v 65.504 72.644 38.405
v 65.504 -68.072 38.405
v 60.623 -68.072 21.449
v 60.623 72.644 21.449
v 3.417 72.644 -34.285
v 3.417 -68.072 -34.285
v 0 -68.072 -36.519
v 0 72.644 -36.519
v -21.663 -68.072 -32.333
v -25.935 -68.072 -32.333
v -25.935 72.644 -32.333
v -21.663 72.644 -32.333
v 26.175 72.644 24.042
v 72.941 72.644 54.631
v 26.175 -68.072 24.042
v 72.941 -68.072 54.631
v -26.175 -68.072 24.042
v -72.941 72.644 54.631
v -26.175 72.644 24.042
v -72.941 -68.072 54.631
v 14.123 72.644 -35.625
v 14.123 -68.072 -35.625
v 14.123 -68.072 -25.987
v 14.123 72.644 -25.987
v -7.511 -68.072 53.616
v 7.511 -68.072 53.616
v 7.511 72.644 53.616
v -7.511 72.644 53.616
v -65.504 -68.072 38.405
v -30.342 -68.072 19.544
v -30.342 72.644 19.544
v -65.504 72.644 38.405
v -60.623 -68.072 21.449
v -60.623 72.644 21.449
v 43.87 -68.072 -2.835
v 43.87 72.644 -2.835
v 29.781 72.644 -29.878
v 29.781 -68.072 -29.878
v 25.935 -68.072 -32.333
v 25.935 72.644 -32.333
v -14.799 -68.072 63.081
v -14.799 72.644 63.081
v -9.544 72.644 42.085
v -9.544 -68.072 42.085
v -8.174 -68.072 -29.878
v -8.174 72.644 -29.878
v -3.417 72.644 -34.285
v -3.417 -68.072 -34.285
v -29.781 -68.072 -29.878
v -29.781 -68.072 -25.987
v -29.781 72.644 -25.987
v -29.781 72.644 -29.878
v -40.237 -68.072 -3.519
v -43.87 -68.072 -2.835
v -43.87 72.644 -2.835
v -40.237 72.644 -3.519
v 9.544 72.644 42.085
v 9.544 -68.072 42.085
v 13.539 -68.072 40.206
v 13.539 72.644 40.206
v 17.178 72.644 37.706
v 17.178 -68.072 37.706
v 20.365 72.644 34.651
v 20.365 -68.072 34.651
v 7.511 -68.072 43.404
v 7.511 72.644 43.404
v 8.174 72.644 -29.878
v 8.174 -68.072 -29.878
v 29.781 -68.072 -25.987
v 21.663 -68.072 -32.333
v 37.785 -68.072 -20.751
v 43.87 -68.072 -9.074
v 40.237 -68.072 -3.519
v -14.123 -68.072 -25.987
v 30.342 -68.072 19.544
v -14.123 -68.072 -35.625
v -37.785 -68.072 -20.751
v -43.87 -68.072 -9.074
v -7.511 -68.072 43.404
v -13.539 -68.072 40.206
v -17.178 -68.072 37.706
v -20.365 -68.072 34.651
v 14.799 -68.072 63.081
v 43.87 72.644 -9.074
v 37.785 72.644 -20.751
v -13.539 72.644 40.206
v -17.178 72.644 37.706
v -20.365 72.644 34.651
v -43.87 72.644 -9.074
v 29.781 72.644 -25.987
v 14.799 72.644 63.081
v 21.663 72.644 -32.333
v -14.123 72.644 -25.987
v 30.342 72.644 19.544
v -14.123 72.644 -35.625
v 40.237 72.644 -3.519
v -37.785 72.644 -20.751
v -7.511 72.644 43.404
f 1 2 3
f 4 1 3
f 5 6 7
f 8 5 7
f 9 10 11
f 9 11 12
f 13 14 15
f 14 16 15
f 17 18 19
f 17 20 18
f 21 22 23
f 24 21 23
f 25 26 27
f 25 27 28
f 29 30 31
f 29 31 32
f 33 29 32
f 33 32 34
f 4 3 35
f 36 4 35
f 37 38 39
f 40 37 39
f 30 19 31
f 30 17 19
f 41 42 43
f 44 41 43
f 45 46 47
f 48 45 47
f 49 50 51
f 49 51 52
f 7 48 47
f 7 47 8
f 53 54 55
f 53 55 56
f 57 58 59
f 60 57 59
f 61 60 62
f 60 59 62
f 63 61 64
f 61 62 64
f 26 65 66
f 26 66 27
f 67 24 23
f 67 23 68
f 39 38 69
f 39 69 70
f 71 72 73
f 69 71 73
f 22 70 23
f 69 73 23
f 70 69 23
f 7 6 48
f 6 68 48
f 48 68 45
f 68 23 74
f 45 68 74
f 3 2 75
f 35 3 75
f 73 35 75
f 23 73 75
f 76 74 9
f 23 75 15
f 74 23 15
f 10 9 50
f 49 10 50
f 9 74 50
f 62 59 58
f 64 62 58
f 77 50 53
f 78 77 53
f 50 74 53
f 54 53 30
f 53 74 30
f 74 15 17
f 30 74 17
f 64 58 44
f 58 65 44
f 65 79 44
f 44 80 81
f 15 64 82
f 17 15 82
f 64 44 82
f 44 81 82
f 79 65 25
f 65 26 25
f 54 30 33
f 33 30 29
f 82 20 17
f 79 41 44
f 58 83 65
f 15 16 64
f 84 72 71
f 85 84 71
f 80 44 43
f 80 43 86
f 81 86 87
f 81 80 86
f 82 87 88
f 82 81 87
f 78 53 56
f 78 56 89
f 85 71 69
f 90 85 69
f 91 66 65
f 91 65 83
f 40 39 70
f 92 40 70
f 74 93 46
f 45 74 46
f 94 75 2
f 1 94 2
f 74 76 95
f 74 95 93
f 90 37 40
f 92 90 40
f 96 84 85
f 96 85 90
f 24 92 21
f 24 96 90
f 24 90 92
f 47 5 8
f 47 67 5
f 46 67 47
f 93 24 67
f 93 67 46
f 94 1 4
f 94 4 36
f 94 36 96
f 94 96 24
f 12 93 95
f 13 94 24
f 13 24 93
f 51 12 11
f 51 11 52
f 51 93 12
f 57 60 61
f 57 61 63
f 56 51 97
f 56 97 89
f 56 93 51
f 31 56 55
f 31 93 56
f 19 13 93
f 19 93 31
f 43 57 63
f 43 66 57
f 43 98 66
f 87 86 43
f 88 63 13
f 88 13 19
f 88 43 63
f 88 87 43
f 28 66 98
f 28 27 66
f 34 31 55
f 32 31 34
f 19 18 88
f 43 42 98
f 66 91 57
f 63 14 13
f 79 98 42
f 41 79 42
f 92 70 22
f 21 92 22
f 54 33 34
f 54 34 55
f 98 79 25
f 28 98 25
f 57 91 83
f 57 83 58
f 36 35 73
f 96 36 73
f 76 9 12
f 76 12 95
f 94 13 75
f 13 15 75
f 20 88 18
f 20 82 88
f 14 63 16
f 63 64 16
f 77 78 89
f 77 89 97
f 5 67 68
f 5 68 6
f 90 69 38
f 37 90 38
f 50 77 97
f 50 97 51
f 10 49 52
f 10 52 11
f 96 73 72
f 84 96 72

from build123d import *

# Parameters (mm, degrees)
F1_DEPTH      = 68.072
F1_DEPTH_BACK = 72.644


with BuildPart() as f1:
    # F0 (on Front) → F1 (new body, two sides)
    with BuildSketch(Plane.XZ) as f1_sk:
        with BuildLine():
            Line((-43.8699675724, 4.9395202659), (-26.3915906821, 9.9711745287))
            ThreePointArc((-26.3915906821, 9.9711745287), (-27.2085319986, 17.0209655839), (-26.1747674174, 24.042238818))
            Line((-26.1747674174, 24.042238818), (-30.3419636079, 19.5435739099))
            Line((-30.3419636079, 19.5435739099), (-43.8699675724, 4.9395202659))
        make_face()
        with BuildLine():
            ThreePointArc((-9.5438323287, 42.0849398232), (-15.4092627723, 39.0301381471), (-20.3645734785, 34.6506423572))
            Line((-20.3645734785, 34.6506423572), (-7.1865939535, 29.6427810635))
            Line((-7.1865939535, 29.6427810635), (-7.1865939535, 32.6668713242))
            Line((-7.1865939535, 32.6668713242), (-9.5438323287, 42.0849398232))
        make_face()
        with BuildLine():
            Line((0, -36.5192646342), (0, -10.610057041))
            ThreePointArc((0, -10.610057041), (-16.7339710743, -4.8564916944), (-26.3915906821, 9.9711745287))
            Line((-26.3915906821, 9.9711745287), (-43.8699675724, 4.9395202659))
            Line((-43.8699675724, 4.9395202659), (-30.3419636079, 19.5435739099))
            Line((-30.3419636079, 19.5435739099), (-65.5041635036, 38.4049154818))
            Line((-65.5041635036, 38.4049154818), (-60.6228390417, 21.448736815))
            Line((-60.6228390417, 21.448736815), (-43.8699675724, -2.8352683876))
            Line((-43.8699675724, -2.8352683876), (-40.2366704703, -3.5186973045))
            Line((-40.2366704703, -3.5186973045), (-43.8699675724, -9.0736041914))
            Line((-43.8699675724, -9.0736041914), (-37.7853512764, -20.751086995))
            Line((-37.7853512764, -20.751086995), (-29.7805646327, -25.9867765768))
            Line((-29.7805646327, -25.9867765768), (-29.7805646327, -29.878012836))
            Line((-29.7805646327, -29.878012836), (-25.9352512658, -32.3328636587))
            Line((-25.9352512658, -32.3328636587), (-21.6632075608, -32.3328636587))
            Line((-21.6632075608, -32.3328636587), (-14.1229508445, -35.6245934963))
            Line((-14.1229508445, -35.6245934963), (-14.1229508445, -25.9867765768))
            Line((-14.1229508445, -25.9867765768), (-8.1736836948, -29.878012836))
            Line((-8.1736836948, -29.878012836), (-3.4166643449, -34.2845275061))
            Line((-3.4166643449, -34.2845275061), (0, -36.5192646342))
        make_face()
        Polygon((0, 26.9117504358), (-7.1865939535, 29.6427810635), (-7.1865939535, 21.905059882), align=None)
        with BuildLine():
            Line((-7.1865939535, 42.5278679195), (-7.293939468, 42.8177008727))
            ThreePointArc((-7.293939468, 42.8177008727), (-8.4268543632, 42.4757869761), (-9.5438323287, 42.0849398232))
            Line((-9.5438323287, 42.0849398232), (-7.1865939535, 32.6668713242))
            Line((-7.1865939535, 32.6668713242), (-7.1865939535, 42.5278679195))
        make_face()
        with BuildLine():
            ThreePointArc((-20.3645734785, 34.6506423572), (-23.8665481201, 29.673348875), (-26.1747674174, 24.042238818))
            Line((-26.1747674174, 24.042238818), (-14.7990193218, 16.6017049924))
            Line((-14.7990193218, 16.6017049924), (-7.1865939535, 21.905059882))
            Line((-7.1865939535, 21.905059882), (-7.1865939535, 29.6427810635))
            Line((-7.1865939535, 29.6427810635), (-20.3645734785, 34.6506423572))
        make_face()
        with BuildLine():
            Line((-72.940915823, 54.6305663884), (-26.1747674174, 24.042238818))
            ThreePointArc((-26.1747674174, 24.042238818), (-23.8665481201, 29.673348875), (-20.3645734785, 34.6506423572))
            Line((-20.3645734785, 34.6506423572), (-72.940915823, 54.6305663884))
        make_face()
        with BuildLine():
            ThreePointArc((-26.1747674174, 24.042238818), (-27.2085319986, 17.0209655839), (-26.3915906821, 9.9711745287))
            Line((-26.3915906821, 9.9711745287), (-21.5597059578, 11.3621717319))
            Line((-21.5597059578, 11.3621717319), (-26.1747674174, 24.042238818))
        make_face()
        with BuildLine():
            ThreePointArc((-9.5438323287, 42.0849398232), (-8.4268543632, 42.4757869761), (-7.293939468, 42.8177008727))
            Line((-7.293939468, 42.8177008727), (-14.7990193218, 63.081420958))
            Line((-14.7990193218, 63.081420958), (-9.5438323287, 42.0849398232))
        make_face()
        Polygon((-4.6579921618, 35.7006415725), (-7.1865939535, 42.5278679195), (-7.1865939535, 32.6668713242), align=None)
        with BuildLine():
            Line((-7.1865939535, 42.5278679195), (-7.1865939535, 42.8473305385))
            ThreePointArc((-7.1865939535, 42.8473305385), (-7.2402818676, 42.8325706174), (-7.293939468, 42.8177008727))
            Line((-7.293939468, 42.8177008727), (-7.1865939535, 42.5278679195))
        make_face()
        with BuildLine():
            ThreePointArc((-26.3915906821, 9.9711745287), (-16.7339710743, -4.8564916944), (0, -10.610057041))
            ThreePointArc((0, -10.610057041), (19.2416214619, -2.6399164695), (27.2117620334, 16.6017049924))
            ThreePointArc((27.2117620334, 16.6017049924), (21.7356187496, 32.9737198511), (7.5112464838, 42.7562680593))
            Line((7.5112464838, 42.7562680593), (7.5112464838, 11.7172822356))
            Line((7.5112464838, 11.7172822356), (-7.1865939535, 11.7172822356))
            Line((-7.1865939535, 11.7172822356), (-7.1865939535, 21.905059882))
            Line((-7.1865939535, 21.905059882), (-14.7990193218, 16.6017049924))
            Line((-14.7990193218, 16.6017049924), (-26.1747674174, 24.042238818))
            Line((-26.1747674174, 24.042238818), (-21.5597059578, 11.3621717319))
            Line((-21.5597059578, 11.3621717319), (-26.3915906821, 9.9711745287))
        make_face()
        with BuildLine():
            Line((7.5112464838, 11.7172822356), (7.5112464838, 42.7562680593))
            ThreePointArc((7.5112464838, 42.7562680593), (0.1685909551, 43.8129447666), (-7.1865939535, 42.8473305385))
            Line((-7.1865939535, 42.8473305385), (-7.1865939535, 42.5278679195))
            Line((-7.1865939535, 42.5278679195), (-4.6579921618, 35.7006415725))
            Line((-4.6579921618, 35.7006415725), (-7.1865939535, 32.6668713242))
            Line((-7.1865939535, 32.6668713242), (-7.1865939535, 29.6427810635))
            Line((-7.1865939535, 29.6427810635), (0, 26.9117504358))
            Line((0, 26.9117504358), (-7.1865939535, 21.905059882))
            Line((-7.1865939535, 21.905059882), (-7.1865939535, 11.7172822356))
            Line((-7.1865939535, 11.7172822356), (7.5112464838, 11.7172822356))
        make_face()
        with BuildLine():
            ThreePointArc((-7.1865939535, 42.8473305385), (0.1685909551, 43.8129447666), (7.5112464838, 42.7562680593))
            Line((7.5112464838, 42.7562680593), (7.5112464838, 53.6164604127))
            Line((7.5112464838, 53.6164604127), (-7.1865939535, 53.6164604127))
            Line((-7.1865939535, 53.6164604127), (-7.1865939535, 42.8473305385))
        make_face()
    extrude(amount=F1_DEPTH)
    extrude(f1_sk.sketch, amount=-F1_DEPTH_BACK)

    # F2: F1 across plane


with BuildPart() as f1_1:
    add(f1.part)
    add(f1.part.mirror(Plane.YZ))


solid = f1_1.part
